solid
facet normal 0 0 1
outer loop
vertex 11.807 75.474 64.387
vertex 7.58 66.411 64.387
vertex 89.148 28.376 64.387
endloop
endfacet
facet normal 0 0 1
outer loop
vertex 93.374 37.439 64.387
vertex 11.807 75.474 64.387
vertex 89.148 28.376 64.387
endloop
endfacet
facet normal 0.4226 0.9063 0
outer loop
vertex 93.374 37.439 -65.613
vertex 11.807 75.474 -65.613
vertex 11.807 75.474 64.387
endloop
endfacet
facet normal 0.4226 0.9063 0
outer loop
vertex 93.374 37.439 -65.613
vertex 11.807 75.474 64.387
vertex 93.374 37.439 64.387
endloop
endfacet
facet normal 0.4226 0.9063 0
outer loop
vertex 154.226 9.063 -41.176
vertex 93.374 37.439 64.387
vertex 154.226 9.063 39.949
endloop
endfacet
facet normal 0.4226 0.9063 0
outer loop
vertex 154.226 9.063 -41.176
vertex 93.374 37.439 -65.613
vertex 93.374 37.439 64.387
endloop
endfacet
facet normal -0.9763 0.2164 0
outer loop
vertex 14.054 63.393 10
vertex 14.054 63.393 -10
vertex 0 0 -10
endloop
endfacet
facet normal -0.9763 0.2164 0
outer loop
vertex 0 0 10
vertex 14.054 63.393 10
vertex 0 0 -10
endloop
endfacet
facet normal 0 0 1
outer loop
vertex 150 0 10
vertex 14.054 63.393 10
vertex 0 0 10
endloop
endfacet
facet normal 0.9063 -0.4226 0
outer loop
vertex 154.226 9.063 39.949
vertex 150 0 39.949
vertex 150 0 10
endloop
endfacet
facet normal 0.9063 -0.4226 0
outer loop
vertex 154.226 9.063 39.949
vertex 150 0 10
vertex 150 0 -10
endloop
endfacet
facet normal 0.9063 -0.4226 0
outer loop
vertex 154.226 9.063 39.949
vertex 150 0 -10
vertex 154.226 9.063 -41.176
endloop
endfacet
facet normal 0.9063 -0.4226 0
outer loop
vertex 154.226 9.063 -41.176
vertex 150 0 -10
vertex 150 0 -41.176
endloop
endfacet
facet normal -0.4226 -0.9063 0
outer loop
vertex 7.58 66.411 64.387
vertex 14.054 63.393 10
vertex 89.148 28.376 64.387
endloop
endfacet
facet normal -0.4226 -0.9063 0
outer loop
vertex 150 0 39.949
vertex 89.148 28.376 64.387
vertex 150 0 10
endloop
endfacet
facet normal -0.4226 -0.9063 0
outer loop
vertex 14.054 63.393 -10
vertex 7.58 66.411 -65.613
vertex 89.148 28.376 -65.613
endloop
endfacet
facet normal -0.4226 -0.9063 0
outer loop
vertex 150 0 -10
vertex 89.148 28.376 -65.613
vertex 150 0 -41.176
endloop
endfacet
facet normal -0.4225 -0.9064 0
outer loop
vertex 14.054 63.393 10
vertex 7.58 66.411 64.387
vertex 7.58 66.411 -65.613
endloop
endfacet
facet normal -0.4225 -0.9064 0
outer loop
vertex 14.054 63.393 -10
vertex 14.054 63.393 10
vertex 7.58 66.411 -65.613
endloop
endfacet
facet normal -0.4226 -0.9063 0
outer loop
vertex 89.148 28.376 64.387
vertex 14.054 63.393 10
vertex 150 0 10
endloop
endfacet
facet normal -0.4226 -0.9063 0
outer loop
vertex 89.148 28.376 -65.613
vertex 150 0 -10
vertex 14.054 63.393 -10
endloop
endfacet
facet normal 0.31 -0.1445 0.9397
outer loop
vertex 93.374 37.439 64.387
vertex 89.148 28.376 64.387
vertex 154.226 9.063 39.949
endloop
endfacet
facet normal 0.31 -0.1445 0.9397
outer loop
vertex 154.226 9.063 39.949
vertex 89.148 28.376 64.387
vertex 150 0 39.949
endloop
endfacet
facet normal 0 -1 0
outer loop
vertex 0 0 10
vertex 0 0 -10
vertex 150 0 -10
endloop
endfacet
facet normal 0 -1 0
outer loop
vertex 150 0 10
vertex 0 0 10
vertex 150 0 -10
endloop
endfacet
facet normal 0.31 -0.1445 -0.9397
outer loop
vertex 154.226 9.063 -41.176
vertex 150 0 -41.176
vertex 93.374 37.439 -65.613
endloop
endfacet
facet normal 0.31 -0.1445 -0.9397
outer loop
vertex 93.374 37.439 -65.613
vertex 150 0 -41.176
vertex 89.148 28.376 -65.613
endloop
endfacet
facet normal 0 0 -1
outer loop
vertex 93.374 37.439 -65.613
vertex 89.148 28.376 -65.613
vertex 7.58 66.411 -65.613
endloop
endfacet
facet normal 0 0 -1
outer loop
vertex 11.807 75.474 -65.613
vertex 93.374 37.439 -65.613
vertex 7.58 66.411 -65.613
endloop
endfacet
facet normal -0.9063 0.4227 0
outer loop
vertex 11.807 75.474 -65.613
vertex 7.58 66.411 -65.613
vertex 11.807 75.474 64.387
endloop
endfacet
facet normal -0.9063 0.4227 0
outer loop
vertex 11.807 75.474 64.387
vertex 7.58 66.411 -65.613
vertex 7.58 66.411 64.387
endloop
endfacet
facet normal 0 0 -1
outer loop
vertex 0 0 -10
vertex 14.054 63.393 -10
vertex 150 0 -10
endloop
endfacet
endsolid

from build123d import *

# Parameters (mm, degrees)
BOSS_EXTRUDE1_DEPTH      = 10
BOSS_EXTRUDE1_DEPTH_BACK = 10
BOSS_EXTRUDE2_DEPTH      = 10
SKETCH3_W                = 150
SKETCH3_H                = 20
BOSS_EXTRUDE3_DEPTH      = 10


with BuildPart() as part:
    # Sketch1 → Boss-Extrude1 (new, two sides: drawn at the far end of the back side and taken through both)
    with BuildSketch(Plane.XY.offset(-BOSS_EXTRUDE1_DEPTH_BACK)):
        Polygon((0, 0), (150, 0), (14.053831945, 63.392739261), align=None)
    extrude(amount=BOSS_EXTRUDE1_DEPTH + BOSS_EXTRUDE1_DEPTH_BACK)



with BuildPart() as body_2:
    # Sketch2 → Boss-Extrude2 (new body)
    with BuildSketch(Plane(origin=(26.790929274, 57.453333234, 0), x_dir=(0.9063077870366495, -0.42261826174070033, 0), z_dir=(0.42261826174070033, 0.9063077870366495, 0))):
        Polygon((68.803496006, 65.613486746), (-21.196503994, 65.613486746), (-21.196503994, -64.386513254), (68.803496006, -64.386513254), (135.946168055, -39.948579179), (135.946168055, -10), (-14.053831945, -10), (-14.053831945, 10), (135.946168055, 10), (135.946168055, 41.175552671), align=None)
    extrude(amount=BOSS_EXTRUDE2_DEPTH)


with BuildPart() as part_1:
    add(part.part)

    add(body_2.part)  # Boss-Extrude3 merges body 2
    # Sketch3 → Boss-Extrude3 (add)
    with BuildSketch(Plane(origin=(26.790929274, 57.453333234, 0), x_dir=(0.9063077870366495, -0.42261826174070033, 0), z_dir=(0.42261826174070033, 0.9063077870366495, 0))):
        with Locations((60.946168055, 0)):
            Rectangle(SKETCH3_W, SKETCH3_H)
    extrude(amount=BOSS_EXTRUDE3_DEPTH)


solid = part_1.part
